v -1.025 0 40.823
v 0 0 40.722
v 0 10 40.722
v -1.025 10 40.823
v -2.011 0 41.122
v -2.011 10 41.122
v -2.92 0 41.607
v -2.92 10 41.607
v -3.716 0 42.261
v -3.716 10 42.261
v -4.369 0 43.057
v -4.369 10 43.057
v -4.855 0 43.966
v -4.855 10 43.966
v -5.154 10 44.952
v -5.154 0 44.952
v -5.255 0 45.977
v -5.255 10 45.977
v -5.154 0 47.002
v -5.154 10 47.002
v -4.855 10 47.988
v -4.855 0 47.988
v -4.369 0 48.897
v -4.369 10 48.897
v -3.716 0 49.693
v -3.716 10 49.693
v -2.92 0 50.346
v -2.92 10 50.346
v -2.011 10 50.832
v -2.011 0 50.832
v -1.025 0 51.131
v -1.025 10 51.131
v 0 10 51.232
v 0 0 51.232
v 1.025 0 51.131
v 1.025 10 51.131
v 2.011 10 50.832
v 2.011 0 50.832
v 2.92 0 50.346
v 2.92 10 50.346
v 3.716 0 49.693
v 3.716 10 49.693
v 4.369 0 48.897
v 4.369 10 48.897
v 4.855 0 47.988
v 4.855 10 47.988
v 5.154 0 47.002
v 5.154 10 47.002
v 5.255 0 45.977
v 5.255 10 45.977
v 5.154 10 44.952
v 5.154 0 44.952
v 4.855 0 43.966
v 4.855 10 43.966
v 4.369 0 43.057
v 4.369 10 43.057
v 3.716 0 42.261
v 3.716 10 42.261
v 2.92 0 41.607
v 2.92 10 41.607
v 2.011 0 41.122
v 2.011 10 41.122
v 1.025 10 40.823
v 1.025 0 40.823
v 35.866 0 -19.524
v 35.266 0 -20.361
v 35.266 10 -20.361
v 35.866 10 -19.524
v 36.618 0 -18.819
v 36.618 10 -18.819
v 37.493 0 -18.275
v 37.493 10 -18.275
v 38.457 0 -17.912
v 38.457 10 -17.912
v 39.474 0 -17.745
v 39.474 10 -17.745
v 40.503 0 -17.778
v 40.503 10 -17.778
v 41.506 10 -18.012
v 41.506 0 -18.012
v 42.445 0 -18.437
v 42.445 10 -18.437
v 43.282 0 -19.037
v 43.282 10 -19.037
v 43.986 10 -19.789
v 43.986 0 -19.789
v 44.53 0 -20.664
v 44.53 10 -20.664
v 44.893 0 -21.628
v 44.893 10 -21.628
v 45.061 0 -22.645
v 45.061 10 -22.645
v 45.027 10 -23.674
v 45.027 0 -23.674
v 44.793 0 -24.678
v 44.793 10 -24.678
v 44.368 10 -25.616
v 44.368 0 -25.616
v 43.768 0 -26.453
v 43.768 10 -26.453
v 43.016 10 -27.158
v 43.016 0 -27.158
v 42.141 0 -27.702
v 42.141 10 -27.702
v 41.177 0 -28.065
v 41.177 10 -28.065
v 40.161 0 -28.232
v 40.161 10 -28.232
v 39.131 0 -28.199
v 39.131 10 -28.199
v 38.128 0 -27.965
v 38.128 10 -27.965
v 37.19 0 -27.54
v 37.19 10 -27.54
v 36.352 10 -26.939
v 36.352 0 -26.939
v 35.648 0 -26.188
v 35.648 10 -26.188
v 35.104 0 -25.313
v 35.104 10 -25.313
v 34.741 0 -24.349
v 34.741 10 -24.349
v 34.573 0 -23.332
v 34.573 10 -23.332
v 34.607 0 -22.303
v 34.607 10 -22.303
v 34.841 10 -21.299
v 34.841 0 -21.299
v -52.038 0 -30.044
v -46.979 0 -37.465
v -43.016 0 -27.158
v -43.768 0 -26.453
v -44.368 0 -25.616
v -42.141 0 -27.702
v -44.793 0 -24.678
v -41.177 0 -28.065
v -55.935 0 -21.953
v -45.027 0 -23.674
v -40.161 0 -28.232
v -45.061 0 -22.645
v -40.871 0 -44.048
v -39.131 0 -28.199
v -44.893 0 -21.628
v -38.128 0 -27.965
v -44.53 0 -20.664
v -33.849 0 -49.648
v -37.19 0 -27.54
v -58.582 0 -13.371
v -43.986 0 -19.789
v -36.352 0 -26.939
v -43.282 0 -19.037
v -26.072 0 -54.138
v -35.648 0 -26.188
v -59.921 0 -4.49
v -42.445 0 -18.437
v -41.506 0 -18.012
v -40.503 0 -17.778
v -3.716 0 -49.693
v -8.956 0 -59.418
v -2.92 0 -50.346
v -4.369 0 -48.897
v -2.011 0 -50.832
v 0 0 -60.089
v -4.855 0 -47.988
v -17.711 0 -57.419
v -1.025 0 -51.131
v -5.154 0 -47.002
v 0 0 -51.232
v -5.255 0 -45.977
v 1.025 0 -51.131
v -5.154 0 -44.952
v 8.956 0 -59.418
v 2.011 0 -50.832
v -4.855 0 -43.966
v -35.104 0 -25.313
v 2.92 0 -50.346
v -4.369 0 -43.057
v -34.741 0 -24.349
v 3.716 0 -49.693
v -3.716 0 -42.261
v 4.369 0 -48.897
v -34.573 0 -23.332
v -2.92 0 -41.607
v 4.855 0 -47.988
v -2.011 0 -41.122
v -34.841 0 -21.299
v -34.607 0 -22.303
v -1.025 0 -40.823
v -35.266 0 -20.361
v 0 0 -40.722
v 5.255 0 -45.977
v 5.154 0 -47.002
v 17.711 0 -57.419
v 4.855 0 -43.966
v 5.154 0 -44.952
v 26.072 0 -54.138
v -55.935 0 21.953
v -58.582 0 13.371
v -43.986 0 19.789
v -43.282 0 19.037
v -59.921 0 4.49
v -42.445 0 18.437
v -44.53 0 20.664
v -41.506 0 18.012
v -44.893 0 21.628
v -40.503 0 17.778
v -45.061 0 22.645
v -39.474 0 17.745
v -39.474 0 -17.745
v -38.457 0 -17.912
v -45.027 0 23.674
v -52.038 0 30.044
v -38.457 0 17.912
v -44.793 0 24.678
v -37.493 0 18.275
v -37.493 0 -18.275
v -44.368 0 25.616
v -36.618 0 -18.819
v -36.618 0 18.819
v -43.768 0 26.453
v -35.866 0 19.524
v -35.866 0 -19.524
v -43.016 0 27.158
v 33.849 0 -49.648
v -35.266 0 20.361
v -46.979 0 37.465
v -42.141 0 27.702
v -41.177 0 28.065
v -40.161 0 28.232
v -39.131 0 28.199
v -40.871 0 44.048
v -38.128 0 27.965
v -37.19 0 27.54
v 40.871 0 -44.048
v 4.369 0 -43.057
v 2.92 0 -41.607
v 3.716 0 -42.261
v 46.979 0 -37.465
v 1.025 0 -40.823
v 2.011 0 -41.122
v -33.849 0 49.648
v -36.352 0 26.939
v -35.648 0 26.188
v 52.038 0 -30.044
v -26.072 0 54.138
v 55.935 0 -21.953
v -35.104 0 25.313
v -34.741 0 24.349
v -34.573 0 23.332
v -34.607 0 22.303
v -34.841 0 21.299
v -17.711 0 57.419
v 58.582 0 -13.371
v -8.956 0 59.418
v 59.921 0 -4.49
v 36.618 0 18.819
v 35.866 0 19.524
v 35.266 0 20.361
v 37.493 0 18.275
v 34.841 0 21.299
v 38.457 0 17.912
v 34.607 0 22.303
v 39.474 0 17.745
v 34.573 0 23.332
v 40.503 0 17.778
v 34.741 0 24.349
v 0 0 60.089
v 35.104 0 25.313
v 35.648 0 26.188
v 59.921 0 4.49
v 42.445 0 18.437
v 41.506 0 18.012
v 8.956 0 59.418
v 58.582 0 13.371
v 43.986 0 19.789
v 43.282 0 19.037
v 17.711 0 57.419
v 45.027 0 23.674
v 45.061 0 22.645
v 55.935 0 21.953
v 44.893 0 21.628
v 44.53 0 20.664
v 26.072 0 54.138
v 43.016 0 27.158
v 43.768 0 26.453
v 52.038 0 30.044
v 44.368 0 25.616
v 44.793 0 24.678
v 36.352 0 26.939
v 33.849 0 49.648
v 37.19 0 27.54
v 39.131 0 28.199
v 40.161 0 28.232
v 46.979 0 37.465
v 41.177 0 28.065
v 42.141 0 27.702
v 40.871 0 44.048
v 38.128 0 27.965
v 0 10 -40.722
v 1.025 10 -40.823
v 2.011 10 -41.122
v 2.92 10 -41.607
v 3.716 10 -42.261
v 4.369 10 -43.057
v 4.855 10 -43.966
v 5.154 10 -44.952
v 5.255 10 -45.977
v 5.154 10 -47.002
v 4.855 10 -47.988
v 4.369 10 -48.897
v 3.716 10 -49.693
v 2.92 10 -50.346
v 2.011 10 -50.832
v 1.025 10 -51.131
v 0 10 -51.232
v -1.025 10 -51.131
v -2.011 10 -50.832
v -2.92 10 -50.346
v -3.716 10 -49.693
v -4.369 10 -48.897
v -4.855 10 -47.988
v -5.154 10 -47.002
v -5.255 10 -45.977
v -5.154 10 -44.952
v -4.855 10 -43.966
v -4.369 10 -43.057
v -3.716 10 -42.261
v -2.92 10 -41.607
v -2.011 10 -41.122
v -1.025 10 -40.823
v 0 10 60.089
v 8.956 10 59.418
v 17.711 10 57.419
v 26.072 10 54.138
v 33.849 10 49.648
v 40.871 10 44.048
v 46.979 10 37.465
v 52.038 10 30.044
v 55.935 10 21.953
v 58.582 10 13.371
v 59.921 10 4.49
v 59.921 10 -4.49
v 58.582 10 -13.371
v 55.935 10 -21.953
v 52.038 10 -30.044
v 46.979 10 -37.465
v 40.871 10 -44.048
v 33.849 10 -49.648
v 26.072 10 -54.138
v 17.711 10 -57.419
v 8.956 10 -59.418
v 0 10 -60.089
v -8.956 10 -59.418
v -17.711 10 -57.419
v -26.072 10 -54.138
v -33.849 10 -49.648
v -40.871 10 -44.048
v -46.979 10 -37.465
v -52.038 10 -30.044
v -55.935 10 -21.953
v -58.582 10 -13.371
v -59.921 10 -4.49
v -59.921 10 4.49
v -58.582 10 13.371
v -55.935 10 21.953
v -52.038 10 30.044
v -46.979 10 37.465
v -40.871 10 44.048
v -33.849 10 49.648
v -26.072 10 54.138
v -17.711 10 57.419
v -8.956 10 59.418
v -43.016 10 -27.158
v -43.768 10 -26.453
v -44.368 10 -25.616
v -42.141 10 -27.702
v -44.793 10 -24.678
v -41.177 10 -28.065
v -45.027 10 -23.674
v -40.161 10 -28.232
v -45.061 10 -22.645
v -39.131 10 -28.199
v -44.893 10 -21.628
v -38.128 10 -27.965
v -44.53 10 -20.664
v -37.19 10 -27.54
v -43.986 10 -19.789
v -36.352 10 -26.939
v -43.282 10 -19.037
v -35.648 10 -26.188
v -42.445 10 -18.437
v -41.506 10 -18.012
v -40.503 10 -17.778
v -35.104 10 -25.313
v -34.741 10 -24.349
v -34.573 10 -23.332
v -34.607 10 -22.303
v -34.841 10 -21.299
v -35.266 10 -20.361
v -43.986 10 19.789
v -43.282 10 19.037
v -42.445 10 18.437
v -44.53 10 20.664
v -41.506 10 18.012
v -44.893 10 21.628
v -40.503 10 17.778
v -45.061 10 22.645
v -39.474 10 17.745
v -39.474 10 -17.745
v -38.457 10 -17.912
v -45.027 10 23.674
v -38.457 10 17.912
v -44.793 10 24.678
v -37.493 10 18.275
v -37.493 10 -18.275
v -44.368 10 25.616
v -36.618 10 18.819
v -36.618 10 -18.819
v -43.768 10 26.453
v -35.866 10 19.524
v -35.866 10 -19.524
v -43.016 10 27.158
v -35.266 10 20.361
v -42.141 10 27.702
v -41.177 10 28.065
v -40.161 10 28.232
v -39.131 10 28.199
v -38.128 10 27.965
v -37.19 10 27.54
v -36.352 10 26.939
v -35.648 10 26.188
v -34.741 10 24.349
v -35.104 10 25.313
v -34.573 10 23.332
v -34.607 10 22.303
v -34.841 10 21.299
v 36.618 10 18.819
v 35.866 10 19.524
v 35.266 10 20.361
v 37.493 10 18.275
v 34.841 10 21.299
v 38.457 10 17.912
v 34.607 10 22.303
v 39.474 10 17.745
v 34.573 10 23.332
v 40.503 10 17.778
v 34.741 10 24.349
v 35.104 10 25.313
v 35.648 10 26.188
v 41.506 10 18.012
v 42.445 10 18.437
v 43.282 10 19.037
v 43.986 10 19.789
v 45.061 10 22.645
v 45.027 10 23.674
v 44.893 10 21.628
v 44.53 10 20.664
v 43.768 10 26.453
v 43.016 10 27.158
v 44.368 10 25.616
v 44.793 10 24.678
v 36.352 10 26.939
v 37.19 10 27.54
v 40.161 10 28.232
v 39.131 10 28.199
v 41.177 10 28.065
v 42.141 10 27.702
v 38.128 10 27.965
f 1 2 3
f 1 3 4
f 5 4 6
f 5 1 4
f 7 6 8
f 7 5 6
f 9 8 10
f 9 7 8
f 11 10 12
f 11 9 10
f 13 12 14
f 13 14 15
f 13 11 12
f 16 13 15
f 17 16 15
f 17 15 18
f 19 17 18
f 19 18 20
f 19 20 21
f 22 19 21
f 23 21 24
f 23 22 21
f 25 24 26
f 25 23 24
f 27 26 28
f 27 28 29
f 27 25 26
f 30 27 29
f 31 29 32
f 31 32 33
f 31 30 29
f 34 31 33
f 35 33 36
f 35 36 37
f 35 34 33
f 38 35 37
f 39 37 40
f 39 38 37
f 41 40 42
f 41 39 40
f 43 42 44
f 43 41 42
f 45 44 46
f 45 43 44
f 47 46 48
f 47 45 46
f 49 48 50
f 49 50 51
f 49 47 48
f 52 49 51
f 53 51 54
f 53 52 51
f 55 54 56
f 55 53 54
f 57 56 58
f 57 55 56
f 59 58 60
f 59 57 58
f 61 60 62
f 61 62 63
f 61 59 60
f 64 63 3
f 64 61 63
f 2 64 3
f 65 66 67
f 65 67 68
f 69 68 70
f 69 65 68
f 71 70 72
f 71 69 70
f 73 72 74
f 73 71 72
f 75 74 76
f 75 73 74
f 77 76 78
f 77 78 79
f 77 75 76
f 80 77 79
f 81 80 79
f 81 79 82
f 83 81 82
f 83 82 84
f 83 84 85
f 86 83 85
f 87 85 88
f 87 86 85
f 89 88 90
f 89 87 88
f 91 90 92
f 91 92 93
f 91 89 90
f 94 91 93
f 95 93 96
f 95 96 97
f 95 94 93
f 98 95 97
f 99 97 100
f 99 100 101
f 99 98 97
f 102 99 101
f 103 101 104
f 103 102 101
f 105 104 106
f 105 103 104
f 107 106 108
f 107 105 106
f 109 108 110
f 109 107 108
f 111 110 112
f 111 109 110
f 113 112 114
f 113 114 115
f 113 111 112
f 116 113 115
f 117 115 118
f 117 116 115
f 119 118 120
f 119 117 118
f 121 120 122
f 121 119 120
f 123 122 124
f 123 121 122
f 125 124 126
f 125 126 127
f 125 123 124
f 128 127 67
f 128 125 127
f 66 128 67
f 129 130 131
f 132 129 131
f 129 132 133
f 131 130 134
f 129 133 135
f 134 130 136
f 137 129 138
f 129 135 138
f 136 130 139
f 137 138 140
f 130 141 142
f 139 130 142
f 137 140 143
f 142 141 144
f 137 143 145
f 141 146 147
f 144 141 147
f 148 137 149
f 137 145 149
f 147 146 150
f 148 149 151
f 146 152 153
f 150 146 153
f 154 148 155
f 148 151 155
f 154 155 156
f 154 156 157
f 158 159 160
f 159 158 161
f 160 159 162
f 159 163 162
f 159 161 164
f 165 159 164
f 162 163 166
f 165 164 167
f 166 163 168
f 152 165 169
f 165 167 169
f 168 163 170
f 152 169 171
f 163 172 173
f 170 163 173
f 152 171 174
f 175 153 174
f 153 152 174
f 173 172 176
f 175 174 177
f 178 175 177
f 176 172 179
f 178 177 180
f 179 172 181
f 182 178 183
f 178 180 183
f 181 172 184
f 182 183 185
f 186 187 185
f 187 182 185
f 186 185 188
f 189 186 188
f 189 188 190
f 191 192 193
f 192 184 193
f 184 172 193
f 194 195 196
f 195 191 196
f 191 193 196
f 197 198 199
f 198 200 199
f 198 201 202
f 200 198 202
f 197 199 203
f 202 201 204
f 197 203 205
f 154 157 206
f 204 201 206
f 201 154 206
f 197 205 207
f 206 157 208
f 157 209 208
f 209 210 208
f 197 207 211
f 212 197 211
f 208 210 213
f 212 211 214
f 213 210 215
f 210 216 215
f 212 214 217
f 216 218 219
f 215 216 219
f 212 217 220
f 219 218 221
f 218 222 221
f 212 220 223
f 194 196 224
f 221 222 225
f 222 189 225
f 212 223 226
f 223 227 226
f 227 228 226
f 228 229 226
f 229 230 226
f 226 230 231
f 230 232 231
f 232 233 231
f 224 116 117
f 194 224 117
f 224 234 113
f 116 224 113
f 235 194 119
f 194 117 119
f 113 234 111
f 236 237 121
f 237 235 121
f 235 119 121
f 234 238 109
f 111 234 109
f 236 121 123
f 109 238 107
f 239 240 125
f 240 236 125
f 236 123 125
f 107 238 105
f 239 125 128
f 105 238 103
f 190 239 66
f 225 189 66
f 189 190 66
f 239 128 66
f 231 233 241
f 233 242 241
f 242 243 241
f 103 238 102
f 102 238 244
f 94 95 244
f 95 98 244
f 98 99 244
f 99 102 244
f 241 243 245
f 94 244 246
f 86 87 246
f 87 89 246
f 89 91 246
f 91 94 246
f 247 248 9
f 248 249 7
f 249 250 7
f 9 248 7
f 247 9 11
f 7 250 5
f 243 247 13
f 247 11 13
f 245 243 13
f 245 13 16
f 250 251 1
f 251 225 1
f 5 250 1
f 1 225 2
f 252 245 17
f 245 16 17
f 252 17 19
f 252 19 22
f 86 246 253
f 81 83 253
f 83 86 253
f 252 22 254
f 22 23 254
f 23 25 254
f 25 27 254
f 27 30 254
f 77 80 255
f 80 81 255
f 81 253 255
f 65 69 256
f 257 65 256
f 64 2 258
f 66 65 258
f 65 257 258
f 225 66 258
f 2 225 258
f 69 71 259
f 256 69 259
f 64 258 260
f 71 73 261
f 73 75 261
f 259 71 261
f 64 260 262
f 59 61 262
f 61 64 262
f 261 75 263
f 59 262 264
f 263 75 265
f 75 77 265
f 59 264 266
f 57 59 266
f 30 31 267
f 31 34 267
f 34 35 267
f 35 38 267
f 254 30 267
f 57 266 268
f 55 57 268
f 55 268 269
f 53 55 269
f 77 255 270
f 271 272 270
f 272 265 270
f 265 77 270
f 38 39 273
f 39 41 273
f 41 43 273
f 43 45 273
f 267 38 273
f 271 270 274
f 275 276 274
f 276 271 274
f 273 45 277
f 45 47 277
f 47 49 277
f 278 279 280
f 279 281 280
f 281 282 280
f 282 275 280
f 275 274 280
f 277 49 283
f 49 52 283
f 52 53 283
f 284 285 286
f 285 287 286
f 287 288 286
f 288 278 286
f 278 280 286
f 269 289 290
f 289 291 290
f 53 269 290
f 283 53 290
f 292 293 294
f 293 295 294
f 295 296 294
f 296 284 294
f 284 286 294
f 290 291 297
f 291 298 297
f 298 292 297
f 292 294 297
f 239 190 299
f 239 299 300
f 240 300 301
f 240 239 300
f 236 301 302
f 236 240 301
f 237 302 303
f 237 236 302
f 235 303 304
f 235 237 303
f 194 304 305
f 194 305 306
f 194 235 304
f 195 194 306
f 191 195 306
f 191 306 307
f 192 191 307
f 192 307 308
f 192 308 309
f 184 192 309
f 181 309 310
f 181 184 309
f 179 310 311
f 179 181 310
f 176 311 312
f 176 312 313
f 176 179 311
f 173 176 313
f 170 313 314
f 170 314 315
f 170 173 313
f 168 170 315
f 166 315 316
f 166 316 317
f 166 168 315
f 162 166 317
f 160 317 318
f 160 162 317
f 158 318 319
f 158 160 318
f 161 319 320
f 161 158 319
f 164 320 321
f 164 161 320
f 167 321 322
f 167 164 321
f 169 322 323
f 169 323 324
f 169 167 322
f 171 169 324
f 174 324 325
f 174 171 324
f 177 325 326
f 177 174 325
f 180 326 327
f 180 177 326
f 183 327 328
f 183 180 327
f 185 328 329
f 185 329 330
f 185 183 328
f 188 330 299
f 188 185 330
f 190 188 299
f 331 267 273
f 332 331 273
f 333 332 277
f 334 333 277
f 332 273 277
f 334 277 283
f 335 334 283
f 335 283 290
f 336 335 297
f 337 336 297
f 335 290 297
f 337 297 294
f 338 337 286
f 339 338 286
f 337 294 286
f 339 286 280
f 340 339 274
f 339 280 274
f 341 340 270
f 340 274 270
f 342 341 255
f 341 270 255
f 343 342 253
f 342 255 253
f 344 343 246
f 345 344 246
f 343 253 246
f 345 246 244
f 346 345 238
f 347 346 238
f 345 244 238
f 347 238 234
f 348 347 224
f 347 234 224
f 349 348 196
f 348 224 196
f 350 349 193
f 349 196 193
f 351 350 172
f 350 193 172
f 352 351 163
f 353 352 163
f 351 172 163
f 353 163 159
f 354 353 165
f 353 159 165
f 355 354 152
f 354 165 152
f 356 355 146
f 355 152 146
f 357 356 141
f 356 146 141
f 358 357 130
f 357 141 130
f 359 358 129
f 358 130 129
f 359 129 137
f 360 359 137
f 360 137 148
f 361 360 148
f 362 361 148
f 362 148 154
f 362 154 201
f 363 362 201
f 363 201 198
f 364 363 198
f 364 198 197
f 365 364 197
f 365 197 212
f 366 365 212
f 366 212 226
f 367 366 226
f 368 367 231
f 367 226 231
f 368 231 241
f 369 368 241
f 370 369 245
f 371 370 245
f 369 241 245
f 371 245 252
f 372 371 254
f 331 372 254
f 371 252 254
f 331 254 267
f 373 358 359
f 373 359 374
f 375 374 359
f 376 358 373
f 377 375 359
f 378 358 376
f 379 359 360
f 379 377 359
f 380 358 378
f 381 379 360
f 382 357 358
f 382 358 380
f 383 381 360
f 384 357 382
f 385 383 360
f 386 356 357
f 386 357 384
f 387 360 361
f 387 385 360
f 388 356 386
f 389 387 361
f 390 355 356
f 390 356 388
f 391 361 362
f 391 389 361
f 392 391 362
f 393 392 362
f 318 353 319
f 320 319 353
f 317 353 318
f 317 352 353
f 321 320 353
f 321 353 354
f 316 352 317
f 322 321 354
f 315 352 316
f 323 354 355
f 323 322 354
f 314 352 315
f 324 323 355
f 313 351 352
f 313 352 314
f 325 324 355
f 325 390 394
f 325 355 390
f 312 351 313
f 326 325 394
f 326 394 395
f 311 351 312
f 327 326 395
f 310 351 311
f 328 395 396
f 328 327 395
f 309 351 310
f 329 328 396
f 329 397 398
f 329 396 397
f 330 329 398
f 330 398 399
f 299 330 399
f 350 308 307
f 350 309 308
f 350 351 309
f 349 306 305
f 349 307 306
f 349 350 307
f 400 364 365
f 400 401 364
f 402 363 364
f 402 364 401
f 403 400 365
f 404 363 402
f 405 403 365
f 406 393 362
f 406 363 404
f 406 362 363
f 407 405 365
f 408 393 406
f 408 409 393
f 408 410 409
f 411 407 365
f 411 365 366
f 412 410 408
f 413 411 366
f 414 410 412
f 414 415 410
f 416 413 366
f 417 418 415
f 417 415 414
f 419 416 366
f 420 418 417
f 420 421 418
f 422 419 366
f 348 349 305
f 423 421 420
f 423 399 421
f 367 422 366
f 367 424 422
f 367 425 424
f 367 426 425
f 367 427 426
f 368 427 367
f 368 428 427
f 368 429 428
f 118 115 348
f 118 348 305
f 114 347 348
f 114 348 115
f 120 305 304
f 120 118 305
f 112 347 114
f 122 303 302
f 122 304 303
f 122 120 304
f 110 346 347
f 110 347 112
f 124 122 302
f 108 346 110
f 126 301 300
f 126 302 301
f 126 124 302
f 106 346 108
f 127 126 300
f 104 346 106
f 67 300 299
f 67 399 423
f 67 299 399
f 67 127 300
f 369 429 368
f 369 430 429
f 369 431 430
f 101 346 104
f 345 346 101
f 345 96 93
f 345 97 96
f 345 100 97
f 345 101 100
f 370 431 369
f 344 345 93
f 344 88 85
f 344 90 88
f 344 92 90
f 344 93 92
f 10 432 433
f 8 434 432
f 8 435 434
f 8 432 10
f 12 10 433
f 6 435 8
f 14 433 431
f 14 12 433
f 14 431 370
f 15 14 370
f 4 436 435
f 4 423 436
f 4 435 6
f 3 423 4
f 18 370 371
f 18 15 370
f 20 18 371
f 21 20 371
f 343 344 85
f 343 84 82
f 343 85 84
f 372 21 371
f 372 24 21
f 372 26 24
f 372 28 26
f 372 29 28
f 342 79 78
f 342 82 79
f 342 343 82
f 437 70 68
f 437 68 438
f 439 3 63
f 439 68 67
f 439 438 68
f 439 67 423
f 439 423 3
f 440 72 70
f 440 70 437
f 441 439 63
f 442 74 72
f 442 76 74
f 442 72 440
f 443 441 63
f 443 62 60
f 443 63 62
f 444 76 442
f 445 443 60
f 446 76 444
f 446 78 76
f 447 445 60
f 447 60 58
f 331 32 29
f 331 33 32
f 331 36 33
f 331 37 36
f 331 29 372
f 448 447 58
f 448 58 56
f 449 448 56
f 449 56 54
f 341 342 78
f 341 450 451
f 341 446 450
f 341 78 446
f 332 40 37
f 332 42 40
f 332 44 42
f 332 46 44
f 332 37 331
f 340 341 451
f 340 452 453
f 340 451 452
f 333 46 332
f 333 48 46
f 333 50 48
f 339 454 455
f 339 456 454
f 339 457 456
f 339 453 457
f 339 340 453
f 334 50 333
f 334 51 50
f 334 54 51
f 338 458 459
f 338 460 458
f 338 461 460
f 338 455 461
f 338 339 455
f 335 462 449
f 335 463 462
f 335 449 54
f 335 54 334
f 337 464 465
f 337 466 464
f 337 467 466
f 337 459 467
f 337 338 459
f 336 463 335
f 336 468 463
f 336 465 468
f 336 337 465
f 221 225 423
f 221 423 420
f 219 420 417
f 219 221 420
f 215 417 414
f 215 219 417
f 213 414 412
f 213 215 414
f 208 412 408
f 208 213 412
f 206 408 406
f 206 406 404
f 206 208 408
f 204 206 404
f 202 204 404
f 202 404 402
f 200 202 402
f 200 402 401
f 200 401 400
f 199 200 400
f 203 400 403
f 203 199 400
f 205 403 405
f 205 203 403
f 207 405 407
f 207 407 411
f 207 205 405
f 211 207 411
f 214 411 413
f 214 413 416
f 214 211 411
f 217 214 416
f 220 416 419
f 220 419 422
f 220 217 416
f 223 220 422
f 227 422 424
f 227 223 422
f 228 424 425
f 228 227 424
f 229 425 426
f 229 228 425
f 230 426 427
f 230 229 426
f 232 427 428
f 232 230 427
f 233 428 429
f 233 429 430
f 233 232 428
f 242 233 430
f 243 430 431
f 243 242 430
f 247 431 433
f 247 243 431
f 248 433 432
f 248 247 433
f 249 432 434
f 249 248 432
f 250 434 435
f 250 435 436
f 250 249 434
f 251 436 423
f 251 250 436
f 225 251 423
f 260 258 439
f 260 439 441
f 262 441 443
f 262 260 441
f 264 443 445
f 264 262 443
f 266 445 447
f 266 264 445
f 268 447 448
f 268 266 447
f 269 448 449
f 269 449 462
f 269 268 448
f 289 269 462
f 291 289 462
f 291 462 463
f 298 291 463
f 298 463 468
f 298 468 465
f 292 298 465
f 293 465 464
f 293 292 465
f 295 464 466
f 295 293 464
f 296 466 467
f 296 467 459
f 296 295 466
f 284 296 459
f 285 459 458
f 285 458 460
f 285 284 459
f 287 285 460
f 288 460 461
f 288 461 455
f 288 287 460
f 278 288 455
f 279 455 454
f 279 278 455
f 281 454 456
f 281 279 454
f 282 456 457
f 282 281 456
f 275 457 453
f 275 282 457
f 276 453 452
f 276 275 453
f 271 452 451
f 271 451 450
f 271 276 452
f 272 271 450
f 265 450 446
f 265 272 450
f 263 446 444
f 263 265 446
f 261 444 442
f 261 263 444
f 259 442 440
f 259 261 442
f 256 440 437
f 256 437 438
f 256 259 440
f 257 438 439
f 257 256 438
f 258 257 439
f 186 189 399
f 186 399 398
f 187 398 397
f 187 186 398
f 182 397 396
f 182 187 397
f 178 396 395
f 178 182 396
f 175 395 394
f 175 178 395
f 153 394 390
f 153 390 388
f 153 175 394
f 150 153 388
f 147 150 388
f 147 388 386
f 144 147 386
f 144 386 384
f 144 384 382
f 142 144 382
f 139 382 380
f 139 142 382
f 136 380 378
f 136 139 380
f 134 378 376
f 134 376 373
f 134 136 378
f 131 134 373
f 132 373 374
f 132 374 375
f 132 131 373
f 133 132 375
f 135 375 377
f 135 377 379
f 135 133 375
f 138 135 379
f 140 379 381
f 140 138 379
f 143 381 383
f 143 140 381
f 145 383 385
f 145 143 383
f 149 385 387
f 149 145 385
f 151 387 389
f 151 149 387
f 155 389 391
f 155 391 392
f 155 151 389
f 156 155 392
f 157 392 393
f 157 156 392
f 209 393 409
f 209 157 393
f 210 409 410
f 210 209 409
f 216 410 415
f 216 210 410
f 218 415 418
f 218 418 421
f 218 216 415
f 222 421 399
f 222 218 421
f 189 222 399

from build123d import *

# Parameters (mm, degrees)
SKETCH1_R           = 60.088817471
BOSS_EXTRUDE1_DEPTH = 10
SKETCH2_R           = 5.255125099
CUT_EXTRUDE1_DEPTH  = 10
CIRPATTERN1_COUNT   = 6


with BuildPart() as part:
    # Sketch1 → Boss-Extrude1 (new body)
    with BuildSketch(Plane(origin=(0, 0, 0), x_dir=(1, 0, 0), z_dir=(0, 1, 0))):
        with Locations(Location((0, 0, 0), (0, 0, 270))):
            Circle(SKETCH1_R)
    extrude(amount=BOSS_EXTRUDE1_DEPTH)

    # Sketch2 → Cut-Extrude1 (cut)
    with BuildSketch(Plane(origin=(0, 0, 0), x_dir=(1, 0, 0), z_dir=(0, 1, 0))):
        with Locations(Location((0, 45.976959249, 0), (0, 0, 270))):
            Circle(SKETCH2_R)
    cut_extrude1 = extrude(amount=CUT_EXTRUDE1_DEPTH, mode=Mode.SUBTRACT)

    # CirPattern1: Cut-Extrude1 ×6 about axis
    cirpattern1_axis = Axis((0, 0, 0), (0, 1, 0))
    for i in range(1, CIRPATTERN1_COUNT):
        add(cut_extrude1.rotate(cirpattern1_axis, i * 360 / CIRPATTERN1_COUNT), mode=Mode.SUBTRACT)


solid = part.part
